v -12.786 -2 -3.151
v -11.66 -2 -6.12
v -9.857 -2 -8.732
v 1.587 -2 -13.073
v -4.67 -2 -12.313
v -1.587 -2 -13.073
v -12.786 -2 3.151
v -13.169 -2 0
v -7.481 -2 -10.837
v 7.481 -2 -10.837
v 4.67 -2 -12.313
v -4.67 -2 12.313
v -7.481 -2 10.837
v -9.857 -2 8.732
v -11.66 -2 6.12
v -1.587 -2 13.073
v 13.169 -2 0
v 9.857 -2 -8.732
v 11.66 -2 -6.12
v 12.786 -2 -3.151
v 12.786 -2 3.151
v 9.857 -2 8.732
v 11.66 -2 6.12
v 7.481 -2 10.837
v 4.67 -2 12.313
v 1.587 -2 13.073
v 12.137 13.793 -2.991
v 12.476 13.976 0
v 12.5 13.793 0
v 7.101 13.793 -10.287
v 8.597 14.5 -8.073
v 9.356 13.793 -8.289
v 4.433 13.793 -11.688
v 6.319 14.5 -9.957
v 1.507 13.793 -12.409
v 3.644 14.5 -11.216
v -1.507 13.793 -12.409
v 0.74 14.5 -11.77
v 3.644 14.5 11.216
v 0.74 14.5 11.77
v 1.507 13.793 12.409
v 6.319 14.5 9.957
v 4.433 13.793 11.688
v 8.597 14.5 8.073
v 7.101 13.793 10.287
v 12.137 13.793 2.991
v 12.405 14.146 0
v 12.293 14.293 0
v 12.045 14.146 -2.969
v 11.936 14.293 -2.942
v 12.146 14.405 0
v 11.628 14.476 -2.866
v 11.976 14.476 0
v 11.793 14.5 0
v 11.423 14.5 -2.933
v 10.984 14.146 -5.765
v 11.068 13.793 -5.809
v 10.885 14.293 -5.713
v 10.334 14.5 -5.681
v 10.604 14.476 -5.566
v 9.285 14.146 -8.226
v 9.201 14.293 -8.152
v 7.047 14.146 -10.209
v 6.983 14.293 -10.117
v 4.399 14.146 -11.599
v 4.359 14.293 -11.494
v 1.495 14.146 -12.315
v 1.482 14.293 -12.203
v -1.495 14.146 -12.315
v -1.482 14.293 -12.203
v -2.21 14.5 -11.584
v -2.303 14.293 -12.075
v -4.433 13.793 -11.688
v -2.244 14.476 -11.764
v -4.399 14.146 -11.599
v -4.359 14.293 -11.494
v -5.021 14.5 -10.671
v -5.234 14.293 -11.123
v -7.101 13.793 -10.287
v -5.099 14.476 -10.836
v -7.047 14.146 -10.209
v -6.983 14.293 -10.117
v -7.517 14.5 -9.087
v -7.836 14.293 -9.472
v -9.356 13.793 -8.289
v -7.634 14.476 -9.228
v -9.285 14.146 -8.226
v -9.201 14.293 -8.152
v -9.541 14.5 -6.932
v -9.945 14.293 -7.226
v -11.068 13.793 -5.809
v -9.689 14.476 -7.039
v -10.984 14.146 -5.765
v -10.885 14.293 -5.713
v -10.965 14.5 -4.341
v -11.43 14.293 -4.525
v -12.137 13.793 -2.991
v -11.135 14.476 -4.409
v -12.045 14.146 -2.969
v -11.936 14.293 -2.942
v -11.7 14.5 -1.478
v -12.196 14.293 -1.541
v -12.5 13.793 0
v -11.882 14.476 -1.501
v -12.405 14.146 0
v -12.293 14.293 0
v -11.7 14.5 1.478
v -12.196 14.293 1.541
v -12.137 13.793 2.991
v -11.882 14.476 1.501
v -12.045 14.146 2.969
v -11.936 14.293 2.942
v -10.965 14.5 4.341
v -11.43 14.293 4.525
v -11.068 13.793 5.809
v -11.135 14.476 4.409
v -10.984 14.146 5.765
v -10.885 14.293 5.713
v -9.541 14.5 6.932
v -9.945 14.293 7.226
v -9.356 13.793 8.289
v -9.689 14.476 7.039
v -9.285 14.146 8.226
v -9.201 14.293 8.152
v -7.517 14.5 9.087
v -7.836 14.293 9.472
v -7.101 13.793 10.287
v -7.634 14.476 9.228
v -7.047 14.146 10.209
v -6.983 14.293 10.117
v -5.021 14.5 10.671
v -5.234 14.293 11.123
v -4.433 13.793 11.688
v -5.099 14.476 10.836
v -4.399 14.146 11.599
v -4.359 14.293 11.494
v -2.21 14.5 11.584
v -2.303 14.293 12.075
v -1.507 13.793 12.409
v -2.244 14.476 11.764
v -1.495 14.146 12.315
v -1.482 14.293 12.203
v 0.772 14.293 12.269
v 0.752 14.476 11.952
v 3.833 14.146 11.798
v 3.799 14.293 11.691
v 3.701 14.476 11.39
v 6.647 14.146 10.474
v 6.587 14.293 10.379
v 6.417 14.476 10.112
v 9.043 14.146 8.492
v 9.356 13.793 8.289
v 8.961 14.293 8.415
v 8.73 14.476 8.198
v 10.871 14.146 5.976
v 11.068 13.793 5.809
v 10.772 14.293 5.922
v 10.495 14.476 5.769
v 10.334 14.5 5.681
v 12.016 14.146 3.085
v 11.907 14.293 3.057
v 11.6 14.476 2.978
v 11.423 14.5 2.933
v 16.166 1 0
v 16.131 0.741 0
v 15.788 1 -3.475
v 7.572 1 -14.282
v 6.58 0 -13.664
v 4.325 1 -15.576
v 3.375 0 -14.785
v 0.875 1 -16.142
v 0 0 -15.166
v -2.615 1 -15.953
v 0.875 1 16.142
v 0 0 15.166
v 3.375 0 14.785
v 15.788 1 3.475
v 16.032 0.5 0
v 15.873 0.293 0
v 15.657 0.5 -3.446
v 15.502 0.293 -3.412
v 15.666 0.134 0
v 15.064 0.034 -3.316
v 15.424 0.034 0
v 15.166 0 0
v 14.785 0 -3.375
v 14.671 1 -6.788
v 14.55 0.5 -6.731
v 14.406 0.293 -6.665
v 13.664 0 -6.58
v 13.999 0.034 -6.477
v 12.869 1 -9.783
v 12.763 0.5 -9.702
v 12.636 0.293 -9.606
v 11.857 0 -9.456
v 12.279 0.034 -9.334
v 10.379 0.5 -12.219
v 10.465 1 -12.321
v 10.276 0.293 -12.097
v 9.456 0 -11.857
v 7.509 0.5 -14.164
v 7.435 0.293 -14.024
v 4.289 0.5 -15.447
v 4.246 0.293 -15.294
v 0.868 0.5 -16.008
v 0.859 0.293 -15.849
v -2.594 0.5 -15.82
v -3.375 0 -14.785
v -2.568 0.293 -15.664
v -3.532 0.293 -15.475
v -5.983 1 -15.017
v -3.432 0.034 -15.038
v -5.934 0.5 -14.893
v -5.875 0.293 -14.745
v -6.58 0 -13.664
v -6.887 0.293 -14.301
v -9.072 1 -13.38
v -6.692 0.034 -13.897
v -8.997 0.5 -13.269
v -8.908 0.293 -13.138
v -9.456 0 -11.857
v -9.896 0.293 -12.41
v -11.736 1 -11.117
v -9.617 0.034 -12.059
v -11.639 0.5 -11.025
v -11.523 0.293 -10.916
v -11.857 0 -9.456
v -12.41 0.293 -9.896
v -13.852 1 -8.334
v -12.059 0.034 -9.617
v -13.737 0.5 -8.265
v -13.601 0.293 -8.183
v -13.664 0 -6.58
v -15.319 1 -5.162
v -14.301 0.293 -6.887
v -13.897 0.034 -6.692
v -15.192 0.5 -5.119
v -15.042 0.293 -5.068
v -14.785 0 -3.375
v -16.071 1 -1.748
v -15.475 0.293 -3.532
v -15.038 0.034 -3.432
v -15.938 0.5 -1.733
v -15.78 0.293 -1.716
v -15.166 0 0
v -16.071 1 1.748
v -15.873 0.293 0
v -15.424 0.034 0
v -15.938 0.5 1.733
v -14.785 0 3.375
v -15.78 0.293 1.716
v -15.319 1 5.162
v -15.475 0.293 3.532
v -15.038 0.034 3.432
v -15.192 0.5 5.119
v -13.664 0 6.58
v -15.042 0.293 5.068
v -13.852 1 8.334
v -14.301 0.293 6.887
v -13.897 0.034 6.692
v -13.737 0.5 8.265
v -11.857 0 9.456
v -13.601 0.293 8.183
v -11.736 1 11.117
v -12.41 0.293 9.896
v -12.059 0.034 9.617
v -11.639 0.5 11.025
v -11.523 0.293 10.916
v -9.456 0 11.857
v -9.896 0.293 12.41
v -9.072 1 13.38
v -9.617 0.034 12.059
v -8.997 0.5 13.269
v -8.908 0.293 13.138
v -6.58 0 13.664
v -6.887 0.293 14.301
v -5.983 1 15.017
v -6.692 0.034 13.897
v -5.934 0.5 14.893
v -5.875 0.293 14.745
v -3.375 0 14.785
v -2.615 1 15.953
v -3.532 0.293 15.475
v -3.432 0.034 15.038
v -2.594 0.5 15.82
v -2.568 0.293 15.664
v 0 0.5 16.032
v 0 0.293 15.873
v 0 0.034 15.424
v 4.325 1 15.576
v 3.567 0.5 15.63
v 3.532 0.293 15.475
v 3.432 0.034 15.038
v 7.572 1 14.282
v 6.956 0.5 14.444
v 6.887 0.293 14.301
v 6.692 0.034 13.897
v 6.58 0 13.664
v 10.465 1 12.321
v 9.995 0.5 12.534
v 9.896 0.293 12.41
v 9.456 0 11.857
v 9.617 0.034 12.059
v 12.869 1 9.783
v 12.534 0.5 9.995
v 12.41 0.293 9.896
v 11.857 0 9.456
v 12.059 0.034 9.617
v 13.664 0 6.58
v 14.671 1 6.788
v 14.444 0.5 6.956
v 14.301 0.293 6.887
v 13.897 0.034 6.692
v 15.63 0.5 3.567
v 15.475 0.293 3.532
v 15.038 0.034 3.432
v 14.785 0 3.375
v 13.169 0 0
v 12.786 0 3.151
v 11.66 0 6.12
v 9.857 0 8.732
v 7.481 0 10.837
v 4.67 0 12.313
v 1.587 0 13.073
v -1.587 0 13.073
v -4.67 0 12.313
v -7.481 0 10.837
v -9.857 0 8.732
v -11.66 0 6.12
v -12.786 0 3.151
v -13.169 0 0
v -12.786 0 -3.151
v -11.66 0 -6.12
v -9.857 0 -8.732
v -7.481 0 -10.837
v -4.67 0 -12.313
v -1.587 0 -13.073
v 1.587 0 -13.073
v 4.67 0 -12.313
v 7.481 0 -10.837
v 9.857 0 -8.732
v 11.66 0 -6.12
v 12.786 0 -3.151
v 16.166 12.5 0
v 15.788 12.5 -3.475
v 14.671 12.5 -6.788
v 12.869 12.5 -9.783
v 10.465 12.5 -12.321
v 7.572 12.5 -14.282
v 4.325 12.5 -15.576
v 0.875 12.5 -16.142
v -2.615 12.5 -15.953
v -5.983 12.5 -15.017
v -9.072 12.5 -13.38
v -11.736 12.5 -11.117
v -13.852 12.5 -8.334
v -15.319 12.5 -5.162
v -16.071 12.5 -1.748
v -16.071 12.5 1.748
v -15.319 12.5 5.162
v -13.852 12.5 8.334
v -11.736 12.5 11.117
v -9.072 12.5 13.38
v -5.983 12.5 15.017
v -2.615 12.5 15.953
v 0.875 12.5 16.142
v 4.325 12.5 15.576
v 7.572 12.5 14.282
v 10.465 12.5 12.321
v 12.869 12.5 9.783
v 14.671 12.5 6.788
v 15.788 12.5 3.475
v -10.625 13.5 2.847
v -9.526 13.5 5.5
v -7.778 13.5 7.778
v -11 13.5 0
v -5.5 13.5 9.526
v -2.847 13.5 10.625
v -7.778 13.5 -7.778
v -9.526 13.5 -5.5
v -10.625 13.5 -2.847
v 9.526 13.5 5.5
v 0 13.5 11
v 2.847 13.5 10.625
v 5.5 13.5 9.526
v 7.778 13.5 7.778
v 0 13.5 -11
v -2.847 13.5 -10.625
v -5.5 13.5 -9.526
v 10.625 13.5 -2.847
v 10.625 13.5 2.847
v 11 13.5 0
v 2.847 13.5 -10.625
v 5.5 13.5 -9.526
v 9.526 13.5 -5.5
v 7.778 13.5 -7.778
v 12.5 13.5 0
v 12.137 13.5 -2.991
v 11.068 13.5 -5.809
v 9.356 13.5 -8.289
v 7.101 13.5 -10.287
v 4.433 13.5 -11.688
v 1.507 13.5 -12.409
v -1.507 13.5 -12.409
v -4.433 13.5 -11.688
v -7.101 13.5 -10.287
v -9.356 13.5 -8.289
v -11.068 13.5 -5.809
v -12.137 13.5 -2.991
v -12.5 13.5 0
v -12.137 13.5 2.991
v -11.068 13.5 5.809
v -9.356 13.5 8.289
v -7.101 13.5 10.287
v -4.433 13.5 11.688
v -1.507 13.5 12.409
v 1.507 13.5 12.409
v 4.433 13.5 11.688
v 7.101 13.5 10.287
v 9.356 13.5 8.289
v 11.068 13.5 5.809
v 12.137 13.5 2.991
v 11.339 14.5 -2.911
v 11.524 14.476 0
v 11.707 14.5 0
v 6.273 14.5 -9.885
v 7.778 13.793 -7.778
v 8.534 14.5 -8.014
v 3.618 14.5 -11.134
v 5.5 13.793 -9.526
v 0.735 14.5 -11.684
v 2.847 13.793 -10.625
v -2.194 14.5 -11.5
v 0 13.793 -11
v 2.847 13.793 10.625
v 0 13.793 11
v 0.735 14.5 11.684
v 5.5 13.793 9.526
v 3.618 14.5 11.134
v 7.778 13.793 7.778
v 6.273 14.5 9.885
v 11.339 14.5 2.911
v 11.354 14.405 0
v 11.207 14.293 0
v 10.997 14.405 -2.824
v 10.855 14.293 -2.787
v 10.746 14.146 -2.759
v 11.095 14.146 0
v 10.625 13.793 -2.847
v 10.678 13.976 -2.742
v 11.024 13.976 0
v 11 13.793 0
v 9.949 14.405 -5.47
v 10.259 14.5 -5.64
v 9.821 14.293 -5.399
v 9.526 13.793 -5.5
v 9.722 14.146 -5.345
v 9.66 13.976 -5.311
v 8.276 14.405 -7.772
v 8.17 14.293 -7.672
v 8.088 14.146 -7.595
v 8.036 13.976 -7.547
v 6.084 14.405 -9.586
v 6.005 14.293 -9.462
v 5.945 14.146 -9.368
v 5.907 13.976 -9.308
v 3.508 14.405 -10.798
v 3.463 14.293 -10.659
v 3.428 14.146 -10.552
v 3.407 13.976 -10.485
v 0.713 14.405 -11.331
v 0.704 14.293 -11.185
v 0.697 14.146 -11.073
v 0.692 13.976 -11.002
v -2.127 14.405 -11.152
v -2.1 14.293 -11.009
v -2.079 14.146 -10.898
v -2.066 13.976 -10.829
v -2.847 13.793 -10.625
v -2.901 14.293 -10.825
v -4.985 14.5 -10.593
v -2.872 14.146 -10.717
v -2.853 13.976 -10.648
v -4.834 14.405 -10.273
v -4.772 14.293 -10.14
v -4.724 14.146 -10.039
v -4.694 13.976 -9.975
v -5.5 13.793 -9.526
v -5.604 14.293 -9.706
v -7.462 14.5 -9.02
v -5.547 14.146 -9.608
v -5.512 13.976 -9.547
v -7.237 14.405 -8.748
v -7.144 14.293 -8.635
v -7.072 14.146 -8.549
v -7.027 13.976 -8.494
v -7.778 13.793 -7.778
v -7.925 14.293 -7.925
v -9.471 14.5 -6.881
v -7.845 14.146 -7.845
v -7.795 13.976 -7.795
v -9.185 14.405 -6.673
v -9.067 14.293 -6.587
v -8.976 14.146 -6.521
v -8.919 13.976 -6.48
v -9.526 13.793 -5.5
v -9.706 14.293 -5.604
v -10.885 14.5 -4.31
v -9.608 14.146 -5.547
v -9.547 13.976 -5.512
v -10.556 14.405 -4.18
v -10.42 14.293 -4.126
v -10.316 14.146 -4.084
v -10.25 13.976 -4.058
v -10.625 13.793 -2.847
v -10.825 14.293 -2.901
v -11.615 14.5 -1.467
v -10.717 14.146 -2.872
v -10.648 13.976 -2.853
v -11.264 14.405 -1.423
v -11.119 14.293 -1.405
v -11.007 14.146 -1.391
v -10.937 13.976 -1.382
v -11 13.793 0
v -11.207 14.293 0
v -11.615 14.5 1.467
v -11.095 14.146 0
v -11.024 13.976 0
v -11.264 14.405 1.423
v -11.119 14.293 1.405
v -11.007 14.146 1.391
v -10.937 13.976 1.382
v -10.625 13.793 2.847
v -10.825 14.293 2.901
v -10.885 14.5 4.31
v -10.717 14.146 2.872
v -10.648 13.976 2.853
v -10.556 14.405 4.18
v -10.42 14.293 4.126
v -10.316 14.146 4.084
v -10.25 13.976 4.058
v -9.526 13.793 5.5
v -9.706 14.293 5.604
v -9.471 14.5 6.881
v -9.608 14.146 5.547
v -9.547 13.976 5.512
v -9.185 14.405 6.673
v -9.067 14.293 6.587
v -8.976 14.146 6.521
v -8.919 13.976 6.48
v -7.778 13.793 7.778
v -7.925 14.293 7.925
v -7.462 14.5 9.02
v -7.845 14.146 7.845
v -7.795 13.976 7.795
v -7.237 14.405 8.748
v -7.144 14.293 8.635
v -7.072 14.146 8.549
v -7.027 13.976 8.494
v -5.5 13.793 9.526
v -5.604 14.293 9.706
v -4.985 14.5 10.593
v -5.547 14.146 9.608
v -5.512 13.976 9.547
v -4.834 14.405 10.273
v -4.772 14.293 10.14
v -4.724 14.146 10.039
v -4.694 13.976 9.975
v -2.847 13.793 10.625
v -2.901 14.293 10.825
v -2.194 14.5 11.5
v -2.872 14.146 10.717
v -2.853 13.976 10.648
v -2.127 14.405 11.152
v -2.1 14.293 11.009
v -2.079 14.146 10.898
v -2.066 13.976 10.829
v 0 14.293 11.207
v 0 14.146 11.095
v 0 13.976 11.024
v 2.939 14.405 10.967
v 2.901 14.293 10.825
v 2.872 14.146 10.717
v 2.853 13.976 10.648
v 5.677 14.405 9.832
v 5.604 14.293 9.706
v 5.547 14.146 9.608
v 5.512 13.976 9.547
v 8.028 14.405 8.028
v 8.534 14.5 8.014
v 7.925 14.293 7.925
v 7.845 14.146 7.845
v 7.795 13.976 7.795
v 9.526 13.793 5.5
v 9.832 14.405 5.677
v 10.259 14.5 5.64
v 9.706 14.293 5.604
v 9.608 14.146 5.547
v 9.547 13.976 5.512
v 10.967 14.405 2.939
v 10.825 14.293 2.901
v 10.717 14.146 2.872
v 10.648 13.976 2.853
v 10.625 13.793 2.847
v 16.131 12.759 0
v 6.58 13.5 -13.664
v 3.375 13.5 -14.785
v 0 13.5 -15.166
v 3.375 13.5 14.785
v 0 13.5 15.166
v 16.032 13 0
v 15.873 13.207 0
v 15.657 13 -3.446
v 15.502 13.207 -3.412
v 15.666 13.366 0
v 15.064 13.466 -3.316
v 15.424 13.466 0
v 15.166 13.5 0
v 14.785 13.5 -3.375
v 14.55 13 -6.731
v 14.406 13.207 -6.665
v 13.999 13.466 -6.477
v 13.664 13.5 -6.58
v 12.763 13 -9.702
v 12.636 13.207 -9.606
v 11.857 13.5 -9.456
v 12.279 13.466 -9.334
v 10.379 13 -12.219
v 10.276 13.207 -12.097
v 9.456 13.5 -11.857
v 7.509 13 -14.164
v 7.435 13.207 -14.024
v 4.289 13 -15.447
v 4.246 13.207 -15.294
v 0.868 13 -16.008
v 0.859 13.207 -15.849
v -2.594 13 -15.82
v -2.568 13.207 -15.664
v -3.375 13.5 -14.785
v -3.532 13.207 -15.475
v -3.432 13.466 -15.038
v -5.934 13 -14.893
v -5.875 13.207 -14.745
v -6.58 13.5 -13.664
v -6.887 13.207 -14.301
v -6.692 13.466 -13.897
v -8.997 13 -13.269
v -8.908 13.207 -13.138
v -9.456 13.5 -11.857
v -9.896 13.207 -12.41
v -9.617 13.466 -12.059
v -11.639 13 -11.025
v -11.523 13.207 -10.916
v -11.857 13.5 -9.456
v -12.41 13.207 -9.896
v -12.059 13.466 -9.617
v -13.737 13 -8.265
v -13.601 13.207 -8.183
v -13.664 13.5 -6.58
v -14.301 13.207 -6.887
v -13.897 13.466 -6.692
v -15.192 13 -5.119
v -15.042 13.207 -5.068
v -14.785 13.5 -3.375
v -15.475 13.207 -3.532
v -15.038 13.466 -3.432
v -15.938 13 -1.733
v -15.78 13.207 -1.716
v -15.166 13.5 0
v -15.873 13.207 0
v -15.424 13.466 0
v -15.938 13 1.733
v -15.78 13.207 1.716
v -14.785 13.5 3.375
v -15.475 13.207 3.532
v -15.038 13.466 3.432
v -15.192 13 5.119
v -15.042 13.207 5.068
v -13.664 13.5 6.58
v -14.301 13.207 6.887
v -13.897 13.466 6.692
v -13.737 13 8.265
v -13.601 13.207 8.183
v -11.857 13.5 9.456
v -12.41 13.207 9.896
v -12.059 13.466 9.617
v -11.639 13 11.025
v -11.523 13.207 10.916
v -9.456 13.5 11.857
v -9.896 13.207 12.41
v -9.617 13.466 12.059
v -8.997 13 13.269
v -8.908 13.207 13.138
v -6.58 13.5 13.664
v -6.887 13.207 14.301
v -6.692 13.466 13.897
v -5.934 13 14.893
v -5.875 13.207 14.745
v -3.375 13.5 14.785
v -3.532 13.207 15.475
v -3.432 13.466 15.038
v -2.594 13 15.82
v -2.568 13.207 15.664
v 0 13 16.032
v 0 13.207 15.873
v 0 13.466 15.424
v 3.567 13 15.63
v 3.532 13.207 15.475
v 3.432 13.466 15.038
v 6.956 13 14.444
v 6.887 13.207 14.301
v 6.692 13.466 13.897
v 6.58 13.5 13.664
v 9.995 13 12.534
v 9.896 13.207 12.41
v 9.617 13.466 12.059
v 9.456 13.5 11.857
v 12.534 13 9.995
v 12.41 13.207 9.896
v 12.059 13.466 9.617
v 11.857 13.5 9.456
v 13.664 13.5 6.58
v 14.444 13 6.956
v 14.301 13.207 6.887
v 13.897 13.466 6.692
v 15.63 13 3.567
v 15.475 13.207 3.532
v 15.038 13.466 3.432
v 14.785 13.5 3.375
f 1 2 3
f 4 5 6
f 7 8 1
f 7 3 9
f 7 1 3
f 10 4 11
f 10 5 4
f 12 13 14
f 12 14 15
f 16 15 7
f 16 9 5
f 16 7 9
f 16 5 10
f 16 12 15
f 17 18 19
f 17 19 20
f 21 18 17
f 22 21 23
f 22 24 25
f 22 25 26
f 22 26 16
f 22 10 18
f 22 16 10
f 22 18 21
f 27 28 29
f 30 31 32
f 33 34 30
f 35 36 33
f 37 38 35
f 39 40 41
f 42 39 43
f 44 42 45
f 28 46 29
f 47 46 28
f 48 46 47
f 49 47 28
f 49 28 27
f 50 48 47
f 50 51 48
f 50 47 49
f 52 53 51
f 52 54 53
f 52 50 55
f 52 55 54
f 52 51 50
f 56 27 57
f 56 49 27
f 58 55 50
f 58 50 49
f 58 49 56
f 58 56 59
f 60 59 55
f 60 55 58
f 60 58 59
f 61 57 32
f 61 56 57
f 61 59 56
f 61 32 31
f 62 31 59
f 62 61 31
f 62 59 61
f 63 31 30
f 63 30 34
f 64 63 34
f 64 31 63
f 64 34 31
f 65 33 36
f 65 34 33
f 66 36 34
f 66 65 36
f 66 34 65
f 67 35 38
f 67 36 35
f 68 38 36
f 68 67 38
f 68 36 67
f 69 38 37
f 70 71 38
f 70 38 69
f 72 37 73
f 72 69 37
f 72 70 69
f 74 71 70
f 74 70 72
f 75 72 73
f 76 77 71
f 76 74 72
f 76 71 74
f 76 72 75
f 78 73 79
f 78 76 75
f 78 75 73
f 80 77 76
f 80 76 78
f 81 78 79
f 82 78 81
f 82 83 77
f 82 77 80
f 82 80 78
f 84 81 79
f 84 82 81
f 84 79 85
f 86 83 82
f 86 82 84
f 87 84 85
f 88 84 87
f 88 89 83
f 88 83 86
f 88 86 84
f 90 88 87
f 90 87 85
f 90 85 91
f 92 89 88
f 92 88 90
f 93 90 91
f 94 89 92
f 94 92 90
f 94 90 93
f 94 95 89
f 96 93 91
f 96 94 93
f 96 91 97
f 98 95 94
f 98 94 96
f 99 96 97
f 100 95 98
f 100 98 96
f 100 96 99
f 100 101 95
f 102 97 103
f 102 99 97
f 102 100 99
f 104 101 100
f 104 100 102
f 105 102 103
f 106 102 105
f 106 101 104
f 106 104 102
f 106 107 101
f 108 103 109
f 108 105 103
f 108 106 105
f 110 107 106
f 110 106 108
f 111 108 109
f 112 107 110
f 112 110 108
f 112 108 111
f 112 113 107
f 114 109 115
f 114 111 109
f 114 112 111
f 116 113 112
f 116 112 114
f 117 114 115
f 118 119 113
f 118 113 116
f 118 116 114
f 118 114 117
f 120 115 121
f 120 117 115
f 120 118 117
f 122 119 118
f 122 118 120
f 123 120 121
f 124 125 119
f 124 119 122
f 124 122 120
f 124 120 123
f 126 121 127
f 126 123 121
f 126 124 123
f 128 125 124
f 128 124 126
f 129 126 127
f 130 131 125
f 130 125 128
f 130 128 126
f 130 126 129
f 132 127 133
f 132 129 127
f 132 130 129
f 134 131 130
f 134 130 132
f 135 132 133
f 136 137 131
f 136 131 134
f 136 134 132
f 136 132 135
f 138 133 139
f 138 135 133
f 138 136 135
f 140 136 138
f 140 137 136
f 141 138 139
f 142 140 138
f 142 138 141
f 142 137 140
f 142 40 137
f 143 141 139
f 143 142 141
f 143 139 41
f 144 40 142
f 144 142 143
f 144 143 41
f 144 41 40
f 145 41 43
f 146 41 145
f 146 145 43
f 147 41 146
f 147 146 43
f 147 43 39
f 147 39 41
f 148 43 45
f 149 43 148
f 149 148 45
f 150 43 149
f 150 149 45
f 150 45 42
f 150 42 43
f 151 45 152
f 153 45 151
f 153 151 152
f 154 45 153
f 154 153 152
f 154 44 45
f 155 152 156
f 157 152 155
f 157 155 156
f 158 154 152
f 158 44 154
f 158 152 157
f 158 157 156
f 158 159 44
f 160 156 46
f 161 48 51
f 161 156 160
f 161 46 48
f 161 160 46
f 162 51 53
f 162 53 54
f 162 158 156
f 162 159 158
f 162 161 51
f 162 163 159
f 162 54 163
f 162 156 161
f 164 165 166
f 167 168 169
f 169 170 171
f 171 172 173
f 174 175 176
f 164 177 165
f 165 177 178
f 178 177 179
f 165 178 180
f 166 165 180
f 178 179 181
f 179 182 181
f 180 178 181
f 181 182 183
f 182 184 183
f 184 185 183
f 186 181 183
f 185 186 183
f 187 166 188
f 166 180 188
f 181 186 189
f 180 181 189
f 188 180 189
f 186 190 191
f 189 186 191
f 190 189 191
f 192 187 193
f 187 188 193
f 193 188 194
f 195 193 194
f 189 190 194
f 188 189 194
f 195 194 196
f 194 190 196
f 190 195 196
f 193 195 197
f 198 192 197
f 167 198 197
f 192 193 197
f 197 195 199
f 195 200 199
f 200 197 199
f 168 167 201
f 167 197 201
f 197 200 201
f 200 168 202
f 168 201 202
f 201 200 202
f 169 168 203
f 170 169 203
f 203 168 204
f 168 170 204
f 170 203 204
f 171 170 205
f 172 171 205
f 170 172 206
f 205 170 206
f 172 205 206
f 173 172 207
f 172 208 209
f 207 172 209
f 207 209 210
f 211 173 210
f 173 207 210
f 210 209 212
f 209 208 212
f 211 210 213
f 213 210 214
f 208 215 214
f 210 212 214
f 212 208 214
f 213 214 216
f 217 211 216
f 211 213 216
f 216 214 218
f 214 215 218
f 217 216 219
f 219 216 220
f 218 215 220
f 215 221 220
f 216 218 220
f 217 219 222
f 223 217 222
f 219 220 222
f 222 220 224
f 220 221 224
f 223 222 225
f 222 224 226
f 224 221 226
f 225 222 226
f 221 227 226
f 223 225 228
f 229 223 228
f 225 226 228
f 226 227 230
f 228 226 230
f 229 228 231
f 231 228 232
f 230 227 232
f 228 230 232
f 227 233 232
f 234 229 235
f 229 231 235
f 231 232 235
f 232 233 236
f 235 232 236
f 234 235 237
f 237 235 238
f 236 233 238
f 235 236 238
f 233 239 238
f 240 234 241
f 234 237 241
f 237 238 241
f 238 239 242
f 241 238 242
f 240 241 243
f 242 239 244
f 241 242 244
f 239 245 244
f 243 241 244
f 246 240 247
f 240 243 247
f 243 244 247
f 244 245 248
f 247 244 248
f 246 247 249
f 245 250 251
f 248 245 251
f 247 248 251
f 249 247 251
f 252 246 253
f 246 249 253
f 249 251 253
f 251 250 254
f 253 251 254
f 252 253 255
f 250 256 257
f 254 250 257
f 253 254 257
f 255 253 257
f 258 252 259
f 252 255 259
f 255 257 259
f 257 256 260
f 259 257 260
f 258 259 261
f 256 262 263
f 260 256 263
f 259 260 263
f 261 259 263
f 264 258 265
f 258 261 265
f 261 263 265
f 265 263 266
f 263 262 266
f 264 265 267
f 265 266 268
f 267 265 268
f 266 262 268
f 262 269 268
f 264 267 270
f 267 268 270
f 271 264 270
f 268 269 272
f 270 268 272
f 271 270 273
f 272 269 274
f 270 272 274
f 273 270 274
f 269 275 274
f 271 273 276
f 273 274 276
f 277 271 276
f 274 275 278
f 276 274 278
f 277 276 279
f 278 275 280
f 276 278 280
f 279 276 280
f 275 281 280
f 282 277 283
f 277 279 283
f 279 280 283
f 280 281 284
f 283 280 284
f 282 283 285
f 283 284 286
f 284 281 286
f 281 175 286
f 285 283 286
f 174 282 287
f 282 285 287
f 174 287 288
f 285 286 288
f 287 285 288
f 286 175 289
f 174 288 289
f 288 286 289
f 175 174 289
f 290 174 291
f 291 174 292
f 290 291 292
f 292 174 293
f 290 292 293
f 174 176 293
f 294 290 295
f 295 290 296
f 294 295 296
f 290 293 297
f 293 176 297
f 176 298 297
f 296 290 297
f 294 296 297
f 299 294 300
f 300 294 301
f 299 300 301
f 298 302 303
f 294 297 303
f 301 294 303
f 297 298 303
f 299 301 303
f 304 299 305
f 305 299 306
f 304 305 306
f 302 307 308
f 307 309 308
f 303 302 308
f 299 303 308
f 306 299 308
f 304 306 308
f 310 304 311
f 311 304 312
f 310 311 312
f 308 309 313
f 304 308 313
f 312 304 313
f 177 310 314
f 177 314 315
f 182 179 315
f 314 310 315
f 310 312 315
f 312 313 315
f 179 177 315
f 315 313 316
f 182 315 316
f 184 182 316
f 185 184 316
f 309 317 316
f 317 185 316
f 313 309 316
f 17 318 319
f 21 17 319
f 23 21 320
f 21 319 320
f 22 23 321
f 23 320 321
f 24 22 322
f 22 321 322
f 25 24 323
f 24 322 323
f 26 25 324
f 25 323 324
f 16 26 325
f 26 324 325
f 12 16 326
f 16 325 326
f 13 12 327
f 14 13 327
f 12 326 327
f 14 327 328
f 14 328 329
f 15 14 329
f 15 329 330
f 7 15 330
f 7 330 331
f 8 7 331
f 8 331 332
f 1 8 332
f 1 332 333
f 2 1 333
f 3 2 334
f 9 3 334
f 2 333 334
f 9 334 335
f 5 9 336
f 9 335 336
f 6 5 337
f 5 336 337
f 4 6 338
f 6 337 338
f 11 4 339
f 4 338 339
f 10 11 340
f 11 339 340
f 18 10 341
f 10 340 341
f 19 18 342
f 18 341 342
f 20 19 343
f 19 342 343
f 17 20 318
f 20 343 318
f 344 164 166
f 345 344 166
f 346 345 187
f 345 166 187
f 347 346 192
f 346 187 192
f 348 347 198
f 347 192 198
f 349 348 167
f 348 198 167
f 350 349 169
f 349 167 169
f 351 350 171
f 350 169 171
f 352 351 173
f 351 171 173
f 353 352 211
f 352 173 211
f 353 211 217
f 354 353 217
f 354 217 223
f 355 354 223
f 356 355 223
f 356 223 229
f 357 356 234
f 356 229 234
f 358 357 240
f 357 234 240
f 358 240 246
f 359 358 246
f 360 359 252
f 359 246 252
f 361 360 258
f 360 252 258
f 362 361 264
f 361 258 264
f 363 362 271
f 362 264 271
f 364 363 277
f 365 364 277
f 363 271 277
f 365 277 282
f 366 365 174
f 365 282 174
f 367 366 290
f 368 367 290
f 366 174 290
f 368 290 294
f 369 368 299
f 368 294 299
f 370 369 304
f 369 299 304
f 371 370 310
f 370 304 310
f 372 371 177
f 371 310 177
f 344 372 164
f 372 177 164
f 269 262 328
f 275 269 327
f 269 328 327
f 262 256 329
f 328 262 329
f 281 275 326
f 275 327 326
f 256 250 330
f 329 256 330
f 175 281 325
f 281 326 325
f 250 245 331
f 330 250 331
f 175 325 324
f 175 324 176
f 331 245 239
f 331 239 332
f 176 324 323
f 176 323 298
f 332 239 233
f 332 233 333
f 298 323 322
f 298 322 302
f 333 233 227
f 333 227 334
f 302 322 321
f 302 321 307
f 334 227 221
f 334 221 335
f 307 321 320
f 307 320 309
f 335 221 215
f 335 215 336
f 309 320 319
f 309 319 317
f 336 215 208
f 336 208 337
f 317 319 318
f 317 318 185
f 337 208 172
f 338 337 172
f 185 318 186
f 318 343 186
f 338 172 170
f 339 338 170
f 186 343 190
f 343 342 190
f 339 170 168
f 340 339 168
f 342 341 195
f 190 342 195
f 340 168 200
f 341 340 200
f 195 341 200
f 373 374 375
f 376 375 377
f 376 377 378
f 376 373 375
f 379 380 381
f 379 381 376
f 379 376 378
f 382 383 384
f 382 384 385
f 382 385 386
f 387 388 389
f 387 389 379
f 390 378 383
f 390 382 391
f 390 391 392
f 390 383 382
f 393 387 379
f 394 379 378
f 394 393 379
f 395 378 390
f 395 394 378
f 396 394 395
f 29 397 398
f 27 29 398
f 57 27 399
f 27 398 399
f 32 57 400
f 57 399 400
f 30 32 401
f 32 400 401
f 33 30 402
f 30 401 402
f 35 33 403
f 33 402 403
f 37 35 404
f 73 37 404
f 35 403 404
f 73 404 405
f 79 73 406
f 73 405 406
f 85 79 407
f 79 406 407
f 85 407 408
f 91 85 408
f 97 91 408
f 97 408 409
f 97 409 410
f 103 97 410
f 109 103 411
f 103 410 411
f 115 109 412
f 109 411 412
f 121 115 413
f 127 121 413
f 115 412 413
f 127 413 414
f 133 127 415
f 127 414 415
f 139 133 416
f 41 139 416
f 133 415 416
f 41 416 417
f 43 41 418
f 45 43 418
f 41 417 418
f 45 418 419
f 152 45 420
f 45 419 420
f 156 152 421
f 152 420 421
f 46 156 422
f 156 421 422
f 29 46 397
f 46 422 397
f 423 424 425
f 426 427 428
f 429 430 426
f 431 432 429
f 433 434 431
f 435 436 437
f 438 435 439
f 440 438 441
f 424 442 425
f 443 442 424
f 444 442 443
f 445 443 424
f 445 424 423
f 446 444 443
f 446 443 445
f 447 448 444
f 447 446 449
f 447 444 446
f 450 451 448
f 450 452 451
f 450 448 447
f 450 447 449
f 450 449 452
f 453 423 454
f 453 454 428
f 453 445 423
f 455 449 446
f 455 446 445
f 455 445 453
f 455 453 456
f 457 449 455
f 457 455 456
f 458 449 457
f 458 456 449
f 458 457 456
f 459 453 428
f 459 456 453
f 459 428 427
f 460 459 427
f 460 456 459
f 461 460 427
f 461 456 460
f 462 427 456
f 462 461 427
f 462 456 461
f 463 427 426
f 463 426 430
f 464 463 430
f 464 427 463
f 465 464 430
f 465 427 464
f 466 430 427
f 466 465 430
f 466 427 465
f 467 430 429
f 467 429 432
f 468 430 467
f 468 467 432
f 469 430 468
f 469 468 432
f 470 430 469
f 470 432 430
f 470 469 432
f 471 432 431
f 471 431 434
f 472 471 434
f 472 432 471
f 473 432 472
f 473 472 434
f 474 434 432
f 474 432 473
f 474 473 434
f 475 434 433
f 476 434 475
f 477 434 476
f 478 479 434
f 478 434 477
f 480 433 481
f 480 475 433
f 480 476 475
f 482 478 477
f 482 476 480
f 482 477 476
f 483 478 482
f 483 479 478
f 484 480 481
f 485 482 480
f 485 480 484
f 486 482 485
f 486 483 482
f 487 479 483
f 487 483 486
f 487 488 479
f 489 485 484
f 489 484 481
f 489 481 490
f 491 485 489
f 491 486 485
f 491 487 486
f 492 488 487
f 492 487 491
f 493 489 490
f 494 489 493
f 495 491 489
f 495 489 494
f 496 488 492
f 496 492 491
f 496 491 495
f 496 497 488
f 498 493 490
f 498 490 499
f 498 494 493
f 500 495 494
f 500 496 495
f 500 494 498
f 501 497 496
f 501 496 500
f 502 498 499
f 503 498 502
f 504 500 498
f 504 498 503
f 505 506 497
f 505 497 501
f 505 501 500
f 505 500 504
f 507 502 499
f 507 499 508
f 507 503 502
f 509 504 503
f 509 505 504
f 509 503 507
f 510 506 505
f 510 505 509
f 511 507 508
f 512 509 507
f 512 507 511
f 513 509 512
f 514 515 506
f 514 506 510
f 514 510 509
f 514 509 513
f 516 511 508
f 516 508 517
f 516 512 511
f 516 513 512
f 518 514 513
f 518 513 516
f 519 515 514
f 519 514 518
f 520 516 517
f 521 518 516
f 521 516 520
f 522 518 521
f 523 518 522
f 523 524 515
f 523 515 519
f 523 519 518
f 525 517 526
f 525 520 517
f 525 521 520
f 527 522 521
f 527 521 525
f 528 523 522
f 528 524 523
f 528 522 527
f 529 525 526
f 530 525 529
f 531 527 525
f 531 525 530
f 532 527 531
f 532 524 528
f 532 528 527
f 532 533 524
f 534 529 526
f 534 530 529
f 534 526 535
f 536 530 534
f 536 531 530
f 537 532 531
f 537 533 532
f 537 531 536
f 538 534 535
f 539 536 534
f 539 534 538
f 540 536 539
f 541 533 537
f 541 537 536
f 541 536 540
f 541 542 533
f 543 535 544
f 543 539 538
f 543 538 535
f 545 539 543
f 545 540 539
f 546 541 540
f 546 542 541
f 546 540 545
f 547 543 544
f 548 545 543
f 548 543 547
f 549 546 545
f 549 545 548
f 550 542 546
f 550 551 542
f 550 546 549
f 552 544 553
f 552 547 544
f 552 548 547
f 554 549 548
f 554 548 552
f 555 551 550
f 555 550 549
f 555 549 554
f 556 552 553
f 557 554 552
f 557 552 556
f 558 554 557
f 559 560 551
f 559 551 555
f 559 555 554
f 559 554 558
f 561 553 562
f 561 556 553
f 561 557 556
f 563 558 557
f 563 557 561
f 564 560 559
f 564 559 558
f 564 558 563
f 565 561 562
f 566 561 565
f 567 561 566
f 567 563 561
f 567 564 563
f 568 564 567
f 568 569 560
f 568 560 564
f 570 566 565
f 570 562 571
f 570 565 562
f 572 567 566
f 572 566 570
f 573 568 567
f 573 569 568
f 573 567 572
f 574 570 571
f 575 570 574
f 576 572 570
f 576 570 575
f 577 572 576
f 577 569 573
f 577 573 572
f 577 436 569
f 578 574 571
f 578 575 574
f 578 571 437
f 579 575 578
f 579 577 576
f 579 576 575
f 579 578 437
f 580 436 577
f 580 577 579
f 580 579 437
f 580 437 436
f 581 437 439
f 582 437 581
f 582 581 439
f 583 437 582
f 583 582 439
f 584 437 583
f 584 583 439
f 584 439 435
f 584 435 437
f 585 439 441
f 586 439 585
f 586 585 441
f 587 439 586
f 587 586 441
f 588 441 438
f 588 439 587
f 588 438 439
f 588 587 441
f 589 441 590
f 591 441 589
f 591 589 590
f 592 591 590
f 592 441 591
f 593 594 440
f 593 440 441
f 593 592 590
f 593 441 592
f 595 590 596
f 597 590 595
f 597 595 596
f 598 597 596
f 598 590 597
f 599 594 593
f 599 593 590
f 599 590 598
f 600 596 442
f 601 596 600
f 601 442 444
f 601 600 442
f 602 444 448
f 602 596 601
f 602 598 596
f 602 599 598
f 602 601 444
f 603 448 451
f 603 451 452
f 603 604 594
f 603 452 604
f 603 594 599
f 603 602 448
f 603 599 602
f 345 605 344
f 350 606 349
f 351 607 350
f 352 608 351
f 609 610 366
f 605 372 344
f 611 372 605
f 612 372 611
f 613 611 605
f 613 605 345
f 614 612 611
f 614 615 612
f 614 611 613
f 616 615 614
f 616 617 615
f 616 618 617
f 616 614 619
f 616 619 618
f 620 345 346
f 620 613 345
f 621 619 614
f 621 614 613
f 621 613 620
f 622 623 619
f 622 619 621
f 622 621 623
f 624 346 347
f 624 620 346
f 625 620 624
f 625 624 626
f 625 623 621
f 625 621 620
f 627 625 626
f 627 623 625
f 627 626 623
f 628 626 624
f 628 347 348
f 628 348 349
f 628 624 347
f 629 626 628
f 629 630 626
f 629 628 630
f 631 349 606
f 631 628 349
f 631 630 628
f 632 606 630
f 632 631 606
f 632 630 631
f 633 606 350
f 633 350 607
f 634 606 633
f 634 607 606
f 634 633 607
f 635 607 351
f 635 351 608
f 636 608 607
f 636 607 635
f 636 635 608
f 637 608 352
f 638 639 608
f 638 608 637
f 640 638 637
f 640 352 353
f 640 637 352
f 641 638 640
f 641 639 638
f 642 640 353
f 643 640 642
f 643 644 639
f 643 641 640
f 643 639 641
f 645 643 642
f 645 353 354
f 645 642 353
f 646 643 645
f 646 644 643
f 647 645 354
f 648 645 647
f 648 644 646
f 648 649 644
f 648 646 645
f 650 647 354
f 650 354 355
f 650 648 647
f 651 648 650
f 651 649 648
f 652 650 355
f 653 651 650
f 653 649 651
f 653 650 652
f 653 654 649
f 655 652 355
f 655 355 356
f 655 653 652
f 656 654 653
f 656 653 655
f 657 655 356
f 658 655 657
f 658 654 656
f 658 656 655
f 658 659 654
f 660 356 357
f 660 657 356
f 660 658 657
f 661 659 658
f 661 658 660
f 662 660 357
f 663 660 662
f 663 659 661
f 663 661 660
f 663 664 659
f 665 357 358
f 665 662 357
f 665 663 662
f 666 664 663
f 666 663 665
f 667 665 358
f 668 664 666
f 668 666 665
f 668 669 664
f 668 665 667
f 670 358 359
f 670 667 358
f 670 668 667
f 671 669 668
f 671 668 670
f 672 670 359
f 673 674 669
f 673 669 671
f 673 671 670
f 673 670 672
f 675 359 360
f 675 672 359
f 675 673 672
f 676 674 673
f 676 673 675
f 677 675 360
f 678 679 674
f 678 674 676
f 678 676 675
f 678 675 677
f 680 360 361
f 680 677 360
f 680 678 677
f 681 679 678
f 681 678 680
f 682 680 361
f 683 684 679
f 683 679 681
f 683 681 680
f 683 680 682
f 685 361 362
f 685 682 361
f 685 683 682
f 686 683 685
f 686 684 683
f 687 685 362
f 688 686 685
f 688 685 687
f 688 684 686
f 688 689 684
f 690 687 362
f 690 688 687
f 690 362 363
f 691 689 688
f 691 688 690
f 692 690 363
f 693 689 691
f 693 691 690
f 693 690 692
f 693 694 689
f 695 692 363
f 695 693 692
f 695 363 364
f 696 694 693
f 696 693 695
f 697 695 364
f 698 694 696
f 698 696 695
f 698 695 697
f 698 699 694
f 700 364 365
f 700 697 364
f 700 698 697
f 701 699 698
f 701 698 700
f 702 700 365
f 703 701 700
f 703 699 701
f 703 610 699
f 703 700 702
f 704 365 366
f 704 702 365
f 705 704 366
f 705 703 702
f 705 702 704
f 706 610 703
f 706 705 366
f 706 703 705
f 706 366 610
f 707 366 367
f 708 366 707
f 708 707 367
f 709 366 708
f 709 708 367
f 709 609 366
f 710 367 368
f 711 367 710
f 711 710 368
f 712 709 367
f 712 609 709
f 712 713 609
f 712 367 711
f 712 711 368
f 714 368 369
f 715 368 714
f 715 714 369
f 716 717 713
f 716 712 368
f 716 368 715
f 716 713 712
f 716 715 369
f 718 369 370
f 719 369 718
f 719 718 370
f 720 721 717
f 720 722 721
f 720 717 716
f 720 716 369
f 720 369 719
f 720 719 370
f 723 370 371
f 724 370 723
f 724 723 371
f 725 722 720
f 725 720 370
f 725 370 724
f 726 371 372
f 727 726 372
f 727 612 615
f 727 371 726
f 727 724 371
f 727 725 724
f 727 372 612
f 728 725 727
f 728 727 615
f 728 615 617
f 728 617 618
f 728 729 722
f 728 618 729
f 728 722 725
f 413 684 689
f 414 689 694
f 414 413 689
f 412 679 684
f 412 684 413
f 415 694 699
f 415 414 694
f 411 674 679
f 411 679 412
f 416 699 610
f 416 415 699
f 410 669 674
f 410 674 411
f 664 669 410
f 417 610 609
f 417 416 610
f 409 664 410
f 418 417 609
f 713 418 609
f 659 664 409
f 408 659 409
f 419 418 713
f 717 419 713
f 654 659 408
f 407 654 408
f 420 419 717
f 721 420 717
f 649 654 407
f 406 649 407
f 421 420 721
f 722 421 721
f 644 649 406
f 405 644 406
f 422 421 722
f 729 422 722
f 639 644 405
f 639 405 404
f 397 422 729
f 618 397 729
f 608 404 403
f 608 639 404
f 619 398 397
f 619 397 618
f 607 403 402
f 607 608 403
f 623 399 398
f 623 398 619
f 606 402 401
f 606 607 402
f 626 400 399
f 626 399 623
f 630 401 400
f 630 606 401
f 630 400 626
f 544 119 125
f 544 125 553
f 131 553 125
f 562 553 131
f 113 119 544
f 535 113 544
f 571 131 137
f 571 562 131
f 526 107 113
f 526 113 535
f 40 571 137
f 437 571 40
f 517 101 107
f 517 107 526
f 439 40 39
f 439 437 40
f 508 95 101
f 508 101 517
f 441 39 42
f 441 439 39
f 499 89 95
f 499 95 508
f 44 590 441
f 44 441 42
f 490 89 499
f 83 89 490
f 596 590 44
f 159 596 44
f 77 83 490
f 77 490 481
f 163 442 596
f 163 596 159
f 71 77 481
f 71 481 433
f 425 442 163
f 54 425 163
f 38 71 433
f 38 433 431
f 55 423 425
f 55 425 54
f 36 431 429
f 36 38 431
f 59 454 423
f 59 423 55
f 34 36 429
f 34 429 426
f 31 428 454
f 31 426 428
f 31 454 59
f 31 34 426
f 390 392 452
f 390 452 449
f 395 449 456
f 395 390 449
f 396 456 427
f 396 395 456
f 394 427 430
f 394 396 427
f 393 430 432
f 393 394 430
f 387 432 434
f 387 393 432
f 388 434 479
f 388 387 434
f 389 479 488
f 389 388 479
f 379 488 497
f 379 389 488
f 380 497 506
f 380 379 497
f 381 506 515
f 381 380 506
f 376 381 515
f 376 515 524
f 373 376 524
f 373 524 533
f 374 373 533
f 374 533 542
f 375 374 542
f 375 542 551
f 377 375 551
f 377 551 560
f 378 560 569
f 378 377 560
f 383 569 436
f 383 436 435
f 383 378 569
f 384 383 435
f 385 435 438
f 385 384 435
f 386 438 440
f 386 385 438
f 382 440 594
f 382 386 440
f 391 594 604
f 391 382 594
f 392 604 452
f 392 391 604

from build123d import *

# Parameters (mm, degrees)
SKETCH1_R           = 16.1655
BOSS_EXTRUDE1_DEPTH = 13.5
FILLET1_R           = 1
SKETCH2_R           = 12.5
SKETCH2_R_2         = 11
BOSS_EXTRUDE2_DEPTH = 1
FILLET4_R           = 0.707
SKETCH3_R           = 13.168514768
BOSS_EXTRUDE3_DEPTH = 2


with BuildPart() as part:
    # Sketch1 → Boss-Extrude1 (new body)
    with BuildSketch(Plane(origin=(0, 0, 0), x_dir=(1, 0, 0), z_dir=(0, 1, 0))):
        Circle(SKETCH1_R)
    extrude(amount=BOSS_EXTRUDE1_DEPTH)

    # Fillet1
    fillet1_edges = [part.edges().sort_by_distance(p)[0] for p in [
        (-16.1655, 0, 0),
        (-16.1655, 13.5, 0),
    ]]
    fillet(fillet1_edges, radius=FILLET1_R)

    # Sketch2 → Boss-Extrude2 (add)
    with BuildSketch(Plane(origin=(0, 13.5, 0), x_dir=(1, 0, 0), z_dir=(0, 1, 0))):
        Circle(SKETCH2_R)
        Circle(SKETCH2_R_2, mode=Mode.SUBTRACT)
    extrude(amount=BOSS_EXTRUDE2_DEPTH)

    # Fillet4
    fillet4_edges = [part.edges().sort_by_distance(p)[0] for p in [
        (-12.5, 14.5, 0),
        (-11, 14.5, 0),
    ]]
    fillet(fillet4_edges, radius=FILLET4_R)

    # Sketch3 → Boss-Extrude3 (add)
    with BuildSketch(Plane.XZ):
        Circle(SKETCH3_R)
    extrude(amount=BOSS_EXTRUDE3_DEPTH)


solid = part.part
